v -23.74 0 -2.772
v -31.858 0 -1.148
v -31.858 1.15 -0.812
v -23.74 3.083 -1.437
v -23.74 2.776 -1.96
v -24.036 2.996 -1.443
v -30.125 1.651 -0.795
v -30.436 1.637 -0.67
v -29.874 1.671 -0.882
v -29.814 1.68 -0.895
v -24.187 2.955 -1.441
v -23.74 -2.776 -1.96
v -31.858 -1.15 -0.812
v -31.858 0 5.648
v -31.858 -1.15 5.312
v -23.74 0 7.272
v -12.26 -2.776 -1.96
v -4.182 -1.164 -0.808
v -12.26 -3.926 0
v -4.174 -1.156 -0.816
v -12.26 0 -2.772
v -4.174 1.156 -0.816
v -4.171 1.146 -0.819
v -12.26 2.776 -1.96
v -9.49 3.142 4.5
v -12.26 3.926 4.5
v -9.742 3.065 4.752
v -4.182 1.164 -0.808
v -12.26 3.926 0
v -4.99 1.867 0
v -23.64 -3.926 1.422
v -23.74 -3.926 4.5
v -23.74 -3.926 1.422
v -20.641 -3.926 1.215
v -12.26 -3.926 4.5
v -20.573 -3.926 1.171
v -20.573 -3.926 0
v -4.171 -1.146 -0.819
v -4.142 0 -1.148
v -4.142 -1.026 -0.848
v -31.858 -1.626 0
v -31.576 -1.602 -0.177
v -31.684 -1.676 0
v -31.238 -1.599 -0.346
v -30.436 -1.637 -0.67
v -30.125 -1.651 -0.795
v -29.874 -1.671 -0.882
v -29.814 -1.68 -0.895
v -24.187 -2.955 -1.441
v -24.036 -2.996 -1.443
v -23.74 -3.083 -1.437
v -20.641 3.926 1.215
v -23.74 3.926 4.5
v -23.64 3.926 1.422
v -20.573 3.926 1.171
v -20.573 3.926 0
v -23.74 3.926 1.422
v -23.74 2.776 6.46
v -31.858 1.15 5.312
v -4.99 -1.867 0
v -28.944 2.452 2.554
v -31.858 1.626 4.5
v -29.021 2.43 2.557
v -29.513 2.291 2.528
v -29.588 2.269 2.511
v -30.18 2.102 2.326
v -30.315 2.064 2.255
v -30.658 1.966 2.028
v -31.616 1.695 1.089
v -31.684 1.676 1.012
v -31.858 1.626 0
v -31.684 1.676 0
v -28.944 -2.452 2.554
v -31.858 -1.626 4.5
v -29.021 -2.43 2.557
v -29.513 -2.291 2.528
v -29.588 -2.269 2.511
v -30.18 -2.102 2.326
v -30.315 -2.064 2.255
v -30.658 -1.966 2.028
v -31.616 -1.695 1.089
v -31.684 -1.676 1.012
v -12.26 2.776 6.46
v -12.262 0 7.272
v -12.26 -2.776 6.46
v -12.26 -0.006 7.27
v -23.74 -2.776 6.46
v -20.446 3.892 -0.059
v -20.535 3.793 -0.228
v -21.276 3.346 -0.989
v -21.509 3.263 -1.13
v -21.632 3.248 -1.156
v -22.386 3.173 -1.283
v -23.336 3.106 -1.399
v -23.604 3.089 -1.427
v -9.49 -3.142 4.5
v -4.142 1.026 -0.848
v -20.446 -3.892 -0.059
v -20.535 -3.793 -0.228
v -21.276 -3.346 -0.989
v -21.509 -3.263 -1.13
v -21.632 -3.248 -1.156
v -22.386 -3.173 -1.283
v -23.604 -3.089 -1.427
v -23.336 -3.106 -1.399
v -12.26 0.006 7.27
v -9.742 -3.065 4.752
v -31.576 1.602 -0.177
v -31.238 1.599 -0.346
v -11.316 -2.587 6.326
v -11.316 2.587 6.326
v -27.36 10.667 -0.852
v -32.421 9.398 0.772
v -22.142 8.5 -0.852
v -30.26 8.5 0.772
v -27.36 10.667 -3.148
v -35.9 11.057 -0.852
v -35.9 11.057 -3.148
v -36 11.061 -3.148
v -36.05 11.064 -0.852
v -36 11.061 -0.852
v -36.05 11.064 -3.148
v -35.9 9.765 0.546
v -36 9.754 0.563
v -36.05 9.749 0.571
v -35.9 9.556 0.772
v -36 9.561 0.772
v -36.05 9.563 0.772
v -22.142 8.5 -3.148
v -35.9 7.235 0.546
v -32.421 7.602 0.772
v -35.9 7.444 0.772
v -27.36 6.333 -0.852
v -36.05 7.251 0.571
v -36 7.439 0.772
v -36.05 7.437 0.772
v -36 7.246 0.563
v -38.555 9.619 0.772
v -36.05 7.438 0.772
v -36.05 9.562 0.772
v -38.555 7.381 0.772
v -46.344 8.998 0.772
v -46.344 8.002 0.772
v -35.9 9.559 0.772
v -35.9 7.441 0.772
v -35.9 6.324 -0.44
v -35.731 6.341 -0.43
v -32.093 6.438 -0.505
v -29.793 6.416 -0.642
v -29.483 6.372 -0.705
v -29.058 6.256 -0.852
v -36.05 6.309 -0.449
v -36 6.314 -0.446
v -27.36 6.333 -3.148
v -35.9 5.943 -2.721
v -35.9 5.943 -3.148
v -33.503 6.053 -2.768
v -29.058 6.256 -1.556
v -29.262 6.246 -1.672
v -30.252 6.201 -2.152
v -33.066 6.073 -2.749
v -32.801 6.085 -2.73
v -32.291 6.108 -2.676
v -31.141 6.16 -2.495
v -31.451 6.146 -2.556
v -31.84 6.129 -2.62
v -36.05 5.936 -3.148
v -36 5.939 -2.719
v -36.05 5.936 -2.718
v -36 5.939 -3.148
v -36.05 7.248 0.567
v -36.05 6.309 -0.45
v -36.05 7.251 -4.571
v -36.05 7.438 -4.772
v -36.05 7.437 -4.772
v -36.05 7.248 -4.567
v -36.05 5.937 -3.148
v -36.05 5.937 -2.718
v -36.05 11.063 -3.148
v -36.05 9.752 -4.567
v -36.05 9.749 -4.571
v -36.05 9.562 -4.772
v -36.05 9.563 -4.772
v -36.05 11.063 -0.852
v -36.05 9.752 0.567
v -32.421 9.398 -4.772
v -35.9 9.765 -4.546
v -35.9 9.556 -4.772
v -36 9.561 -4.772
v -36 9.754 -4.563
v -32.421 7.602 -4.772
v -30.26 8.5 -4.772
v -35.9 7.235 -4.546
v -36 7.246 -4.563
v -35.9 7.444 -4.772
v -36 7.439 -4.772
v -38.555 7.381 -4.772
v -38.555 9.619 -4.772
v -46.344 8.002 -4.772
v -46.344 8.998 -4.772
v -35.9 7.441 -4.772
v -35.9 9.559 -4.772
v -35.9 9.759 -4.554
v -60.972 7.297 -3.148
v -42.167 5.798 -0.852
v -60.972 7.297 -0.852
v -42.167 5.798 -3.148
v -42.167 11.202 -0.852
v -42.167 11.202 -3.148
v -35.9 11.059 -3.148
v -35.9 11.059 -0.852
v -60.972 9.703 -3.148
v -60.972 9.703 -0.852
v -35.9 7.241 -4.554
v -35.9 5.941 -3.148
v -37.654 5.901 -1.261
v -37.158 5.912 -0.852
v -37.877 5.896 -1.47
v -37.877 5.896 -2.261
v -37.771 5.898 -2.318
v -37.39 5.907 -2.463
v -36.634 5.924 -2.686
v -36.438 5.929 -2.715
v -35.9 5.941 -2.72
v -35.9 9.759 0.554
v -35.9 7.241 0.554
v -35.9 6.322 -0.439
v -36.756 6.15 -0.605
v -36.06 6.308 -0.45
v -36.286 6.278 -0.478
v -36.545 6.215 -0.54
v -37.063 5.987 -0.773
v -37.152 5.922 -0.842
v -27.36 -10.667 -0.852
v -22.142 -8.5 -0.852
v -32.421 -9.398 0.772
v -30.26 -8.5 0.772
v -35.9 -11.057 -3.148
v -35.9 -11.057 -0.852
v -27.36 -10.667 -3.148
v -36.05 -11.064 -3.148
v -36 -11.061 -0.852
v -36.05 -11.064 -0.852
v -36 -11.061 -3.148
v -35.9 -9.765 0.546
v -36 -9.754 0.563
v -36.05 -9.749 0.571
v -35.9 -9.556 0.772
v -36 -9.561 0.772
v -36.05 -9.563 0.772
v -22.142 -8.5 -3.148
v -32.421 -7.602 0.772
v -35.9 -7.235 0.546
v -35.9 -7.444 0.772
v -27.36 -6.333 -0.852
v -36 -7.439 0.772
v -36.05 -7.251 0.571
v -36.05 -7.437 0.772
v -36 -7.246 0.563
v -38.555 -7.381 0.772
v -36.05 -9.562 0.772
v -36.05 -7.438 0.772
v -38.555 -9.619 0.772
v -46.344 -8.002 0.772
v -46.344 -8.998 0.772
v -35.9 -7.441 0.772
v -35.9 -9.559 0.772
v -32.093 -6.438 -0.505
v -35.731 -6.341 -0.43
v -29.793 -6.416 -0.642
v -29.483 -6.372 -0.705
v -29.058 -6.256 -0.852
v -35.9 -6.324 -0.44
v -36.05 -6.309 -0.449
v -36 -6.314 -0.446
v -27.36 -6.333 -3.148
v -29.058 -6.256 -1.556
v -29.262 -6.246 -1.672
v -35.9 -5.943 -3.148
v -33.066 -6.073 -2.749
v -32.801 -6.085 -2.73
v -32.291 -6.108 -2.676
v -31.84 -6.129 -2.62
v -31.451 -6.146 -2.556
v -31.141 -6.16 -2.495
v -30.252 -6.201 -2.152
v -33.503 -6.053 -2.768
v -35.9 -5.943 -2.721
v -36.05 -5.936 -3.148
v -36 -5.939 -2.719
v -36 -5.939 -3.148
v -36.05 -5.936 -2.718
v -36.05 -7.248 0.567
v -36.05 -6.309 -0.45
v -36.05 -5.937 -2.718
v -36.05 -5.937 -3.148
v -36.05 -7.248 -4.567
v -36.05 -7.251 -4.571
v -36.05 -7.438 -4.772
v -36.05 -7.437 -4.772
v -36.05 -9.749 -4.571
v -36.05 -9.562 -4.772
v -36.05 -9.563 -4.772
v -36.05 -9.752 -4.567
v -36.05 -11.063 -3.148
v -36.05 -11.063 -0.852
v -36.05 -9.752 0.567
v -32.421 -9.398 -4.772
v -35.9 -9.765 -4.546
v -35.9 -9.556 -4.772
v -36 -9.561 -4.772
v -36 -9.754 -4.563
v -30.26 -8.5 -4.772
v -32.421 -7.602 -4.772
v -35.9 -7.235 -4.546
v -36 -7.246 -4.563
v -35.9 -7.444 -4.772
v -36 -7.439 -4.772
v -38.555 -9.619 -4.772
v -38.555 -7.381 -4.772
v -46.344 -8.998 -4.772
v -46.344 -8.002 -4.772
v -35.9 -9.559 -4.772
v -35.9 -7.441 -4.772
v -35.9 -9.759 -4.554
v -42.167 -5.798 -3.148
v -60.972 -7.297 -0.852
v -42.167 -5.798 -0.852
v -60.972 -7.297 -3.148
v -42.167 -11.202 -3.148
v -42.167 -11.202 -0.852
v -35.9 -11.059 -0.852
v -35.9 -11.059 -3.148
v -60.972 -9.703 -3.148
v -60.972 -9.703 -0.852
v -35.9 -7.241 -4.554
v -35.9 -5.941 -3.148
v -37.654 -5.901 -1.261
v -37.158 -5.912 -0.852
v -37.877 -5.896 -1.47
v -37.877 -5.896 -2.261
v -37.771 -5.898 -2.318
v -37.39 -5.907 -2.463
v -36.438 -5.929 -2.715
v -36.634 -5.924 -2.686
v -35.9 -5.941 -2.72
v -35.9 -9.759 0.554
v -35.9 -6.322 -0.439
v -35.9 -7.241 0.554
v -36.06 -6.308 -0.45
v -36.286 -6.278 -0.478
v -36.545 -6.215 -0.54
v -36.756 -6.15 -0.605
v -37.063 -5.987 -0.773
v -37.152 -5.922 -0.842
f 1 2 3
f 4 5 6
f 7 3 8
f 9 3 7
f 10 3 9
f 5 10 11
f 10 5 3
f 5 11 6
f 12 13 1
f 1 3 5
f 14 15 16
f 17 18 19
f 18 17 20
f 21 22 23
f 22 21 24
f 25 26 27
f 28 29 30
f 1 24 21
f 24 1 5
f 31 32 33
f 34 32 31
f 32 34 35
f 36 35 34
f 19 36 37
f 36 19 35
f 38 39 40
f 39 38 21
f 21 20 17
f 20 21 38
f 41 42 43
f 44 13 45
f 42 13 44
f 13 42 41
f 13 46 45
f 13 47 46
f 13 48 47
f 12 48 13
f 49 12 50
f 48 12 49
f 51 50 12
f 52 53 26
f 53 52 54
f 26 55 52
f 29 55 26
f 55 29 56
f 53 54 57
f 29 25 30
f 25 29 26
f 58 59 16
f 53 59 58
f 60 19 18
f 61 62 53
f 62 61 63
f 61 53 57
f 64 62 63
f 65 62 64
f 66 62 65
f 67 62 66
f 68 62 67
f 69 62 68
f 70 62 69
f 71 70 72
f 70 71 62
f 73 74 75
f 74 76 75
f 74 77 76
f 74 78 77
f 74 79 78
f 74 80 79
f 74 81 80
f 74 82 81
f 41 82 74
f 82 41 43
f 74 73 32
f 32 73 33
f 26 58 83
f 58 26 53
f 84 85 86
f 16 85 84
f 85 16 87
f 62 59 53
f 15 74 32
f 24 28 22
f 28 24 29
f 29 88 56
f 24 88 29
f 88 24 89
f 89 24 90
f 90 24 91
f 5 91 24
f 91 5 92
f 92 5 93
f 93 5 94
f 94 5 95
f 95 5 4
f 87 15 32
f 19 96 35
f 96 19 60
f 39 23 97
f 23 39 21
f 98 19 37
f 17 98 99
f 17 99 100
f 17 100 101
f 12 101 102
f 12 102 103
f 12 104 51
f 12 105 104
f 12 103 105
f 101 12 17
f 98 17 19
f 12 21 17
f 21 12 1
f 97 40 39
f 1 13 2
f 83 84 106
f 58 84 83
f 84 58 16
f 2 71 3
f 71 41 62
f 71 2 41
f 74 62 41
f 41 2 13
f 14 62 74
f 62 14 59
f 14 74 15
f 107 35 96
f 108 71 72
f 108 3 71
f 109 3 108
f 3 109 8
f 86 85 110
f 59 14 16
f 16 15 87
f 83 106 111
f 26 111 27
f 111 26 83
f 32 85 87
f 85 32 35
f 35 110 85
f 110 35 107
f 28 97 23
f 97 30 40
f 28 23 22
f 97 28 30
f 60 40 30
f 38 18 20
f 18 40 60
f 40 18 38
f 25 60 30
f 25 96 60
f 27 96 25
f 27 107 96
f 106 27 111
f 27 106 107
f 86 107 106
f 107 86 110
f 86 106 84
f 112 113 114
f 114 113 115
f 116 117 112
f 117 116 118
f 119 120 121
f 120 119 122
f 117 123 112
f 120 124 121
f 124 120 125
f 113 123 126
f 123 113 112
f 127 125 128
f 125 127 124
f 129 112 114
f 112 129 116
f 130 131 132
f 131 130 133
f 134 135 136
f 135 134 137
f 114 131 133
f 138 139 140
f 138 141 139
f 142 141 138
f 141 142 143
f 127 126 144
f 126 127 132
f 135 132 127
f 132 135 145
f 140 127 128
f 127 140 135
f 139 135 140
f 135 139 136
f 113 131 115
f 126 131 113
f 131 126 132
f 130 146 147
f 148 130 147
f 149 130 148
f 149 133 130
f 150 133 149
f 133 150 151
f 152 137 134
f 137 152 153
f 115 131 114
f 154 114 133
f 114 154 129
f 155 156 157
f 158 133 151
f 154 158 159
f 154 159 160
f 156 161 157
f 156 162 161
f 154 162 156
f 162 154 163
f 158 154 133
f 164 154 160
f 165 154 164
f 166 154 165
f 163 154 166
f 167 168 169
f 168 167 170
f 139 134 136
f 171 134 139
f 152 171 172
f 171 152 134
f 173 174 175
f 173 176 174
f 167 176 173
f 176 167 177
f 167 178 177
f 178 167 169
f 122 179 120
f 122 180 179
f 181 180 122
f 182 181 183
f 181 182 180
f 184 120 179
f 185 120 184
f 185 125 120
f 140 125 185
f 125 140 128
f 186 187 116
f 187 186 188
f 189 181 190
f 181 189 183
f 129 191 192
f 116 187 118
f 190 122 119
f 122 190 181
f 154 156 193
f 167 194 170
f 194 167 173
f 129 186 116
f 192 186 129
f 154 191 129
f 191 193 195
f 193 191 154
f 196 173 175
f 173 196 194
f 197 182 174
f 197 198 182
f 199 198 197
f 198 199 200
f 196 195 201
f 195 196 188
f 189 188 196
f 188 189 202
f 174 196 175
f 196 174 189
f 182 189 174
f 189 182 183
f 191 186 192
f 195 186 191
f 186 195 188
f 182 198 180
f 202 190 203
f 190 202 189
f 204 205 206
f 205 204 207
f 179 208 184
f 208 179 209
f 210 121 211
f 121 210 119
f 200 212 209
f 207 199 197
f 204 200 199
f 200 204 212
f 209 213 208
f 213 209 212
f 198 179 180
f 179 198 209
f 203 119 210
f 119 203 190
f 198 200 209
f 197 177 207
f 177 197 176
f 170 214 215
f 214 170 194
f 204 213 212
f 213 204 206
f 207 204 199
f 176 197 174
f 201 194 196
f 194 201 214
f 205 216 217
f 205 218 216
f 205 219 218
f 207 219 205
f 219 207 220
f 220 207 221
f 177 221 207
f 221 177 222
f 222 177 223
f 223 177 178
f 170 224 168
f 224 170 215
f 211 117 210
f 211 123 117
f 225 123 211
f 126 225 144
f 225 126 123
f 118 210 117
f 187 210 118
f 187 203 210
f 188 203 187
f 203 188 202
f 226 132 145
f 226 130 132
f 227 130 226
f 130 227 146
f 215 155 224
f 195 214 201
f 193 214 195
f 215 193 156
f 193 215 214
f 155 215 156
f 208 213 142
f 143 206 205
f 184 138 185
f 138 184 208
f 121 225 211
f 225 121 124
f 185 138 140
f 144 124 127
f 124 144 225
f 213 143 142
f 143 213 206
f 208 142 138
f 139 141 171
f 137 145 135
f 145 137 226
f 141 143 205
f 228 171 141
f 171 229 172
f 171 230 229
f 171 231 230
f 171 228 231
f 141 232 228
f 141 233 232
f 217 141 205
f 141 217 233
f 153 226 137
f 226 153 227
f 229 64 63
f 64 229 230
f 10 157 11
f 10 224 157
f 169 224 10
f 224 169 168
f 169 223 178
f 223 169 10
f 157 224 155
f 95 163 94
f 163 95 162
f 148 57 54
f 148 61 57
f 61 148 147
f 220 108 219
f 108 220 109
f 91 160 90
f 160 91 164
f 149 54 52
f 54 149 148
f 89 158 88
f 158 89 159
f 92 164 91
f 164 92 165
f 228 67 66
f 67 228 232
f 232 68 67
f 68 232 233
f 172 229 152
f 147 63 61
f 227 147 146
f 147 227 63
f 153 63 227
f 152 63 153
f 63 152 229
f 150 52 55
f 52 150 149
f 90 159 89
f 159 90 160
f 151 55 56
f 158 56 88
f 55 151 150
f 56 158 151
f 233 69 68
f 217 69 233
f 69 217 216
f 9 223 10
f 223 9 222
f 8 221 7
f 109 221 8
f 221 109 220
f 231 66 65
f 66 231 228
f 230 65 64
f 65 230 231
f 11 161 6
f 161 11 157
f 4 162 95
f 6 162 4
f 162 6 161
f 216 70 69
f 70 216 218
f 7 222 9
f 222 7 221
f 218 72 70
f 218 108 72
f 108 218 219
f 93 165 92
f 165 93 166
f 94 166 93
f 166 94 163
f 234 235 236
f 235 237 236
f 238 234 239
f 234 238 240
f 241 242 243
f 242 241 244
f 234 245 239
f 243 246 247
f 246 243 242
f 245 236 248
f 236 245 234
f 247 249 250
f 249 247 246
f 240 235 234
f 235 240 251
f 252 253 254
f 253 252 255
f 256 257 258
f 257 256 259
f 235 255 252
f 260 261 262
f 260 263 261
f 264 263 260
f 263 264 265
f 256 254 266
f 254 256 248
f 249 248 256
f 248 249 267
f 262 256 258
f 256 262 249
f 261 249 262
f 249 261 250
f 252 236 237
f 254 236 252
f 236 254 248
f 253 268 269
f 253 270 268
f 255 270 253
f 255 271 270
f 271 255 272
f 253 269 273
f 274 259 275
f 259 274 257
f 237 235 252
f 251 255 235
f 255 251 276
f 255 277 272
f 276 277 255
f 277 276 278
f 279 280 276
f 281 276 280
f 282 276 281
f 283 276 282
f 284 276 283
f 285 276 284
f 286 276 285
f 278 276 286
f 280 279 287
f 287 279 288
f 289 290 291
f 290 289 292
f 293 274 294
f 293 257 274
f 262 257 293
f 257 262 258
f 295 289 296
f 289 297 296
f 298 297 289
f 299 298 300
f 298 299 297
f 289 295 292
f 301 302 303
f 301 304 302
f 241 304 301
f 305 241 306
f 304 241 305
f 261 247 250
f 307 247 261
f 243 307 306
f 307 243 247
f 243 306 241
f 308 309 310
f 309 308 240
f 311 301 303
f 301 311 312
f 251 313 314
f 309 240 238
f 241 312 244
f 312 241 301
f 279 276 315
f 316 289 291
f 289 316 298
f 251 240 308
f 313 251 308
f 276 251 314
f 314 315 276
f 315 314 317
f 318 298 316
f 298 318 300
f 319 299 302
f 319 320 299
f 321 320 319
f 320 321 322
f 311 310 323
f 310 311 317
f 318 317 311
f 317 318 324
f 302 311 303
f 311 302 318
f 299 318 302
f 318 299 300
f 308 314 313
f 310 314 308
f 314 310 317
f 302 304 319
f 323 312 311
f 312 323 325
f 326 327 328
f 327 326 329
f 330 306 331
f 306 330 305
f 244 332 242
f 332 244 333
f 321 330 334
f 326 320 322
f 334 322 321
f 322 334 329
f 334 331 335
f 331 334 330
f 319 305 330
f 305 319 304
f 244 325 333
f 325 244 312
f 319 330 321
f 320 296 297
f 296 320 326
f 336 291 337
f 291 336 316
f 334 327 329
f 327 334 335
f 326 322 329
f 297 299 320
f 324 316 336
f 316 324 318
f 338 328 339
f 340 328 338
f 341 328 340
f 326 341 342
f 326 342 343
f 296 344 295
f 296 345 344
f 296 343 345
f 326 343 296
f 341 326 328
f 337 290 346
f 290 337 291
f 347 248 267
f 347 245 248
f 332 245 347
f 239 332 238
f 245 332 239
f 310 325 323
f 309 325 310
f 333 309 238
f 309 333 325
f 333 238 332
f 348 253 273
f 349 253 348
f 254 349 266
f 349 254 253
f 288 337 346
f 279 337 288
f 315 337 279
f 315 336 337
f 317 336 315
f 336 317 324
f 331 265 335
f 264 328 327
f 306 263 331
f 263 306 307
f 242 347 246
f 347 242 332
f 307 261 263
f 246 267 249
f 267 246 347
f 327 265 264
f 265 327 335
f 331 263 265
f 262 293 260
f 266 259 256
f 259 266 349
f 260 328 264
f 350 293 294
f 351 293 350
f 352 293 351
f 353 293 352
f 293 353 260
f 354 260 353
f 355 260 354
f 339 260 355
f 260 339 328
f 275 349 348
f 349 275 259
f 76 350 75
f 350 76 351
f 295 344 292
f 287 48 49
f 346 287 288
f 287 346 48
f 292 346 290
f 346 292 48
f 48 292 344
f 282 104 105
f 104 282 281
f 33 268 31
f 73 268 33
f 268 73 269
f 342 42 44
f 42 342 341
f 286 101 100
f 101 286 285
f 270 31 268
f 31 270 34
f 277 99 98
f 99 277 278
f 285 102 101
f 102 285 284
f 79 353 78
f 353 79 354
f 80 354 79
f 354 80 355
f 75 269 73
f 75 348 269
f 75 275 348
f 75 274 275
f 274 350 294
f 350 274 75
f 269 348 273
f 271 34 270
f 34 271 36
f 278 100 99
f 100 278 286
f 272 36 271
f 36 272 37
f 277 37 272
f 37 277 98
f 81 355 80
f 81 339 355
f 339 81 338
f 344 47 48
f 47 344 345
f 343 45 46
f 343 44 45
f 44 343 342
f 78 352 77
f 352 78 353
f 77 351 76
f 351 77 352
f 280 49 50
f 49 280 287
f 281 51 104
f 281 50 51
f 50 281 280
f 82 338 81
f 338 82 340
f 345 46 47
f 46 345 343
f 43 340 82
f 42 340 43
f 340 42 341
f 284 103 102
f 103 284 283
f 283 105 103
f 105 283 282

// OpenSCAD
// file: ../lib/util.scad
fn1 = 32;
fn2 = 16;

module util_half_sphere(radius, fn=fn1) {
    difference() {
        sphere(radius, $fn=fn);
        translate([0,0,-(radius+radius/19)])
            cube(2*radius+radius/10, center=true);
    }
}

function gcd(a,b) = a == b ? a : a > b ? gcd(a-b, b) : gcd(a, b-a);

module util_saucer(length, width, height, fn=fn1) {
    rad = gcd(length,gcd(width,height));
    //rad = 10;
    scale([length/(2*rad), width/(2*rad), height/rad])
        util_half_sphere(rad, fn);
}

module util_half_cylinder(length, radius, inner_fn=fn2, outer_fn=fn1) {
    maxval = max(length, 2*radius);
    intersection() {
        difference() {
            rotate([0,90,0])
                translate([0,0,-(length/2 + length/20)])
                    cylinder(length+length/10, radius, radius, $fn=inner_fn);
            
            translate([0,0,(maxval/2 + maxval/19)])
                cube(maxval+maxval/10, center=true);
        }
        
        translate([0,0,-(radius+radius/20)])
            cylinder(radius + radius/10, length/2, length/2, $fn=outer_fn);
    }
}

module util_body(length, width, height, upper_height, fn=fn1) {
    rad = gcd(length, gcd(width, upper_height));
    
    scale(.995) scale([length/(2*rad), width/(2*rad), 1])
        util_half_cylinder(2*rad, height, outer_fn=fn);
}

module util_graded_cylinder(height, radius_start, radius_end, grades=1, fn=fn1) {
    height_grade = height / grades;
    radius_grade = (radius_start - radius_end) / (grades * grades);
    for (i = [0 : 1 : grades]) {
        translate([0,0,i*height_grade])
            cylinder(height_grade, 
                     radius_start - i*radius_grade * i,
                     radius_start - (i+1) * radius_grade * (i+1),
                     $fn = fn);
    }
}

module util_nacelle(length, width, height, curved=false, up=true, front_bulge=false) {
    rad = min(width, height/2);
    grads = curved ? 6 : 1;
    scale_factor = front_bulge ? 1.1 : 1;
    direction = up ? -1 : 1;
    difference() {
        scale([1, width/ (2*rad), height/rad])
            difference() {
                union() {
                    rotate([0,-90,0])
                        rotate(30)
                            util_graded_cylinder(length-rad, rad, rad/2, grads, 6);
                    scale(scale_factor) 
                        rotate([0,90,0]) rotate(90) sphere(rad, $fn=6);
                }
                
                translate([-length/2, 0, direction * (height/2 + height/19)])
                    cube([length+length, width+width, height+height/10], center=true);
            }
        
        translate([-length-(curved?length/3:0), 0, -length/3])
            rotate([0,-45,0])
                cube(length, center=true);
    }
}

module util_mirrored(v) {
    children();
    mirror(v) children();
}

module util_ring(outer, inner, height, fn=fn1) {
    difference() {
        translate([0,0,-height/2])
            cylinder(height, outer, outer, $fn=fn);
        translate([0,0,-(height/2 + height/19)])
            cylinder(height+height/10, inner, inner, $fn=fn);
    }
}

module util_star(radius, thick, num, half=false) {
    angle = 360/num;
    offset = half? angle/2 : 0;
    for (i = [0: 1: num]) {
        rotate(i* angle + offset)
            translate([radius/2,0,0])
                cube([radius, thick, thick], center=true);
    }
}

module util_ring_star(radius, thick, num, inner, half=false) {
    outer=inner+thick;
    avg = (inner + outer)/2;
    union() {
        difference() {
            util_star(radius, thick, num, half);
            cylinder(2*thick, outer, outer, $fn=num, center=true);
        }
        util_ring(outer, inner, thick);
    }
}

module util_hangar_disk(height, lower, upper, num, fn=fn1) {
    difference() {
            cylinder(height, lower, upper, $fn=fn, center=true);
        difference() {
            scale([1,1,22])
                util_star(1.1*upper, height/20, num, half=true);
            scale(.95)
                cylinder(height, lower, upper, $fn=fn, center=true);
        }
    }
}

module util_hangar_form(length, width, height, num, inner=0) {
    l = 0.6* max(length, width);
    h = 2.5* height;
    thick = min(height/20,1);
    inner = inner == 0 ? l/3 : inner;
    difference() {
        children();
        scale([1,1,h/thick]) 
            util_ring_star(l, thick, num, inner, half=true);
    }
    scale(.95) children();
}

module util_nacelle_bar(span, height, width, thickness, faces=fn1) {
    rad = (span*span/(8*height) + height/2);
    outer = rad + thickness/2;
    inner = rad - thickness/2;
    difference(){
        translate([0,0,outer])
            rotate([0,90,0])
                util_ring(outer, inner, width, fn=faces);
    
        translate([0,0,1.1*outer+height])
            cube(2.2*outer, center=true);
    }
}

module util_q_sphere(rad, quadrant, faces) {
    x_sign = quadrant == 1 ? 1 :
             quadrant == 2 ? -1 :
             quadrant == 3 ? -1 :
             quadrant == 4 ? 1 : 0;
    z_sign = quadrant == 1 ? 1 :
             quadrant == 2 ? 1 :
             quadrant == 3 ? -1 :
             quadrant == 4 ? -1 : 0;
    
    difference() {
        sphere(rad, $fn=faces);

        translate([x_sign*(-1.1*rad - .01),0,0])
        cube(2.2*rad, center=true);

        translate([0,0,z_sign*(-1.1*rad - .01)])
        cube(2.2*rad, center=true);
    }
}

module util_ovoid(front_rad, back_rad, width, upper_rad, lower_rad, faces=32) {
    half_width = width/2;
    largest=max(front_rad, back_rad, half_width, upper_rad, lower_rad);
    smallest=min(front_rad, back_rad, half_width, upper_rad, lower_rad);
    
    union() {
        scale([front_rad/smallest, half_width/smallest, upper_rad/smallest])
        util_q_sphere(smallest, 1, faces);
        
        scale([front_rad/smallest, half_width/smallest, lower_rad/smallest])
        util_q_sphere(smallest, 4, faces);
        
        scale([back_rad/smallest, half_width/smallest, lower_rad/smallest])
        util_q_sphere(smallest, 3, faces);
        
        scale([back_rad/smallest, half_width/smallest, upper_rad/smallest])
        util_q_sphere(smallest, 2, faces);
    }
}

module util_saucer_shape(width, height, height_ext, depth, depth_ext) {
    difference() {
        util_ovoid(width/2,
                   width/2,
                   width,
                   height+height_ext,
                   depth+depth_ext);
        
        if (height_ext > 0) {
            translate([0,0,width/2 + height])
            cube(width, center=true);
        }
        
        if (depth_ext > 0) {
            translate([0,0,-width/2 - depth])
            cube(width, center=true);
        }
    }
}

module util_repeat(times, vector) {
    x = vector[0];
    y = vector[1];
    z = vector[2];
    for(i=[0:times]) {
        translate([i*x, i*y, i*z])
        children();
    }
}
// main file
use <../lib/util.scad>;

module attack_primary_placeholder() {
    intersection() {
        translate([-5+.01,0,0])
        rotate([0,-45,0])
        translate([50,0,0])
        cube(100, center=true);


    }
}

module attack_secondary_body() {
    difference() {
        hull() {
//            translate([-15,0,2])
//            util_ovoid(3,3,12,1,1);

            translate([-12-6,0,4.5])
            scale([30,8.5,6])
            rotate([0,90,0])
            sphere(d=1, $fn=8);
            
            translate([-12-6,0,0])
            scale([30,8.5,6])
            rotate([0,90,0])
            sphere(d=1, $fn=8);
        }
            

        attack_primary_placeholder();
    }
}

module attack_secondary() {
    attack_secondary_body();
    attack_secondary_assembly();
}


module attack_secondary_assembly() {
    util_mirrored([0,1,0]) {
        hull() {
            translate([-13,0,2])
            sphere(d=4, $fn=8);

            translate([-26,0,2])
            sphere(d=4, $fn=8);


            translate([-40,12.5-4,-3])
            scale([2,1,1])
            sphere(d=1.5, $fn=8);
        }

        translate([-36,12.5-4,-2])
        util_ovoid(15,30,6,3,3,faces=7);
    }
}

attack_secondary();
